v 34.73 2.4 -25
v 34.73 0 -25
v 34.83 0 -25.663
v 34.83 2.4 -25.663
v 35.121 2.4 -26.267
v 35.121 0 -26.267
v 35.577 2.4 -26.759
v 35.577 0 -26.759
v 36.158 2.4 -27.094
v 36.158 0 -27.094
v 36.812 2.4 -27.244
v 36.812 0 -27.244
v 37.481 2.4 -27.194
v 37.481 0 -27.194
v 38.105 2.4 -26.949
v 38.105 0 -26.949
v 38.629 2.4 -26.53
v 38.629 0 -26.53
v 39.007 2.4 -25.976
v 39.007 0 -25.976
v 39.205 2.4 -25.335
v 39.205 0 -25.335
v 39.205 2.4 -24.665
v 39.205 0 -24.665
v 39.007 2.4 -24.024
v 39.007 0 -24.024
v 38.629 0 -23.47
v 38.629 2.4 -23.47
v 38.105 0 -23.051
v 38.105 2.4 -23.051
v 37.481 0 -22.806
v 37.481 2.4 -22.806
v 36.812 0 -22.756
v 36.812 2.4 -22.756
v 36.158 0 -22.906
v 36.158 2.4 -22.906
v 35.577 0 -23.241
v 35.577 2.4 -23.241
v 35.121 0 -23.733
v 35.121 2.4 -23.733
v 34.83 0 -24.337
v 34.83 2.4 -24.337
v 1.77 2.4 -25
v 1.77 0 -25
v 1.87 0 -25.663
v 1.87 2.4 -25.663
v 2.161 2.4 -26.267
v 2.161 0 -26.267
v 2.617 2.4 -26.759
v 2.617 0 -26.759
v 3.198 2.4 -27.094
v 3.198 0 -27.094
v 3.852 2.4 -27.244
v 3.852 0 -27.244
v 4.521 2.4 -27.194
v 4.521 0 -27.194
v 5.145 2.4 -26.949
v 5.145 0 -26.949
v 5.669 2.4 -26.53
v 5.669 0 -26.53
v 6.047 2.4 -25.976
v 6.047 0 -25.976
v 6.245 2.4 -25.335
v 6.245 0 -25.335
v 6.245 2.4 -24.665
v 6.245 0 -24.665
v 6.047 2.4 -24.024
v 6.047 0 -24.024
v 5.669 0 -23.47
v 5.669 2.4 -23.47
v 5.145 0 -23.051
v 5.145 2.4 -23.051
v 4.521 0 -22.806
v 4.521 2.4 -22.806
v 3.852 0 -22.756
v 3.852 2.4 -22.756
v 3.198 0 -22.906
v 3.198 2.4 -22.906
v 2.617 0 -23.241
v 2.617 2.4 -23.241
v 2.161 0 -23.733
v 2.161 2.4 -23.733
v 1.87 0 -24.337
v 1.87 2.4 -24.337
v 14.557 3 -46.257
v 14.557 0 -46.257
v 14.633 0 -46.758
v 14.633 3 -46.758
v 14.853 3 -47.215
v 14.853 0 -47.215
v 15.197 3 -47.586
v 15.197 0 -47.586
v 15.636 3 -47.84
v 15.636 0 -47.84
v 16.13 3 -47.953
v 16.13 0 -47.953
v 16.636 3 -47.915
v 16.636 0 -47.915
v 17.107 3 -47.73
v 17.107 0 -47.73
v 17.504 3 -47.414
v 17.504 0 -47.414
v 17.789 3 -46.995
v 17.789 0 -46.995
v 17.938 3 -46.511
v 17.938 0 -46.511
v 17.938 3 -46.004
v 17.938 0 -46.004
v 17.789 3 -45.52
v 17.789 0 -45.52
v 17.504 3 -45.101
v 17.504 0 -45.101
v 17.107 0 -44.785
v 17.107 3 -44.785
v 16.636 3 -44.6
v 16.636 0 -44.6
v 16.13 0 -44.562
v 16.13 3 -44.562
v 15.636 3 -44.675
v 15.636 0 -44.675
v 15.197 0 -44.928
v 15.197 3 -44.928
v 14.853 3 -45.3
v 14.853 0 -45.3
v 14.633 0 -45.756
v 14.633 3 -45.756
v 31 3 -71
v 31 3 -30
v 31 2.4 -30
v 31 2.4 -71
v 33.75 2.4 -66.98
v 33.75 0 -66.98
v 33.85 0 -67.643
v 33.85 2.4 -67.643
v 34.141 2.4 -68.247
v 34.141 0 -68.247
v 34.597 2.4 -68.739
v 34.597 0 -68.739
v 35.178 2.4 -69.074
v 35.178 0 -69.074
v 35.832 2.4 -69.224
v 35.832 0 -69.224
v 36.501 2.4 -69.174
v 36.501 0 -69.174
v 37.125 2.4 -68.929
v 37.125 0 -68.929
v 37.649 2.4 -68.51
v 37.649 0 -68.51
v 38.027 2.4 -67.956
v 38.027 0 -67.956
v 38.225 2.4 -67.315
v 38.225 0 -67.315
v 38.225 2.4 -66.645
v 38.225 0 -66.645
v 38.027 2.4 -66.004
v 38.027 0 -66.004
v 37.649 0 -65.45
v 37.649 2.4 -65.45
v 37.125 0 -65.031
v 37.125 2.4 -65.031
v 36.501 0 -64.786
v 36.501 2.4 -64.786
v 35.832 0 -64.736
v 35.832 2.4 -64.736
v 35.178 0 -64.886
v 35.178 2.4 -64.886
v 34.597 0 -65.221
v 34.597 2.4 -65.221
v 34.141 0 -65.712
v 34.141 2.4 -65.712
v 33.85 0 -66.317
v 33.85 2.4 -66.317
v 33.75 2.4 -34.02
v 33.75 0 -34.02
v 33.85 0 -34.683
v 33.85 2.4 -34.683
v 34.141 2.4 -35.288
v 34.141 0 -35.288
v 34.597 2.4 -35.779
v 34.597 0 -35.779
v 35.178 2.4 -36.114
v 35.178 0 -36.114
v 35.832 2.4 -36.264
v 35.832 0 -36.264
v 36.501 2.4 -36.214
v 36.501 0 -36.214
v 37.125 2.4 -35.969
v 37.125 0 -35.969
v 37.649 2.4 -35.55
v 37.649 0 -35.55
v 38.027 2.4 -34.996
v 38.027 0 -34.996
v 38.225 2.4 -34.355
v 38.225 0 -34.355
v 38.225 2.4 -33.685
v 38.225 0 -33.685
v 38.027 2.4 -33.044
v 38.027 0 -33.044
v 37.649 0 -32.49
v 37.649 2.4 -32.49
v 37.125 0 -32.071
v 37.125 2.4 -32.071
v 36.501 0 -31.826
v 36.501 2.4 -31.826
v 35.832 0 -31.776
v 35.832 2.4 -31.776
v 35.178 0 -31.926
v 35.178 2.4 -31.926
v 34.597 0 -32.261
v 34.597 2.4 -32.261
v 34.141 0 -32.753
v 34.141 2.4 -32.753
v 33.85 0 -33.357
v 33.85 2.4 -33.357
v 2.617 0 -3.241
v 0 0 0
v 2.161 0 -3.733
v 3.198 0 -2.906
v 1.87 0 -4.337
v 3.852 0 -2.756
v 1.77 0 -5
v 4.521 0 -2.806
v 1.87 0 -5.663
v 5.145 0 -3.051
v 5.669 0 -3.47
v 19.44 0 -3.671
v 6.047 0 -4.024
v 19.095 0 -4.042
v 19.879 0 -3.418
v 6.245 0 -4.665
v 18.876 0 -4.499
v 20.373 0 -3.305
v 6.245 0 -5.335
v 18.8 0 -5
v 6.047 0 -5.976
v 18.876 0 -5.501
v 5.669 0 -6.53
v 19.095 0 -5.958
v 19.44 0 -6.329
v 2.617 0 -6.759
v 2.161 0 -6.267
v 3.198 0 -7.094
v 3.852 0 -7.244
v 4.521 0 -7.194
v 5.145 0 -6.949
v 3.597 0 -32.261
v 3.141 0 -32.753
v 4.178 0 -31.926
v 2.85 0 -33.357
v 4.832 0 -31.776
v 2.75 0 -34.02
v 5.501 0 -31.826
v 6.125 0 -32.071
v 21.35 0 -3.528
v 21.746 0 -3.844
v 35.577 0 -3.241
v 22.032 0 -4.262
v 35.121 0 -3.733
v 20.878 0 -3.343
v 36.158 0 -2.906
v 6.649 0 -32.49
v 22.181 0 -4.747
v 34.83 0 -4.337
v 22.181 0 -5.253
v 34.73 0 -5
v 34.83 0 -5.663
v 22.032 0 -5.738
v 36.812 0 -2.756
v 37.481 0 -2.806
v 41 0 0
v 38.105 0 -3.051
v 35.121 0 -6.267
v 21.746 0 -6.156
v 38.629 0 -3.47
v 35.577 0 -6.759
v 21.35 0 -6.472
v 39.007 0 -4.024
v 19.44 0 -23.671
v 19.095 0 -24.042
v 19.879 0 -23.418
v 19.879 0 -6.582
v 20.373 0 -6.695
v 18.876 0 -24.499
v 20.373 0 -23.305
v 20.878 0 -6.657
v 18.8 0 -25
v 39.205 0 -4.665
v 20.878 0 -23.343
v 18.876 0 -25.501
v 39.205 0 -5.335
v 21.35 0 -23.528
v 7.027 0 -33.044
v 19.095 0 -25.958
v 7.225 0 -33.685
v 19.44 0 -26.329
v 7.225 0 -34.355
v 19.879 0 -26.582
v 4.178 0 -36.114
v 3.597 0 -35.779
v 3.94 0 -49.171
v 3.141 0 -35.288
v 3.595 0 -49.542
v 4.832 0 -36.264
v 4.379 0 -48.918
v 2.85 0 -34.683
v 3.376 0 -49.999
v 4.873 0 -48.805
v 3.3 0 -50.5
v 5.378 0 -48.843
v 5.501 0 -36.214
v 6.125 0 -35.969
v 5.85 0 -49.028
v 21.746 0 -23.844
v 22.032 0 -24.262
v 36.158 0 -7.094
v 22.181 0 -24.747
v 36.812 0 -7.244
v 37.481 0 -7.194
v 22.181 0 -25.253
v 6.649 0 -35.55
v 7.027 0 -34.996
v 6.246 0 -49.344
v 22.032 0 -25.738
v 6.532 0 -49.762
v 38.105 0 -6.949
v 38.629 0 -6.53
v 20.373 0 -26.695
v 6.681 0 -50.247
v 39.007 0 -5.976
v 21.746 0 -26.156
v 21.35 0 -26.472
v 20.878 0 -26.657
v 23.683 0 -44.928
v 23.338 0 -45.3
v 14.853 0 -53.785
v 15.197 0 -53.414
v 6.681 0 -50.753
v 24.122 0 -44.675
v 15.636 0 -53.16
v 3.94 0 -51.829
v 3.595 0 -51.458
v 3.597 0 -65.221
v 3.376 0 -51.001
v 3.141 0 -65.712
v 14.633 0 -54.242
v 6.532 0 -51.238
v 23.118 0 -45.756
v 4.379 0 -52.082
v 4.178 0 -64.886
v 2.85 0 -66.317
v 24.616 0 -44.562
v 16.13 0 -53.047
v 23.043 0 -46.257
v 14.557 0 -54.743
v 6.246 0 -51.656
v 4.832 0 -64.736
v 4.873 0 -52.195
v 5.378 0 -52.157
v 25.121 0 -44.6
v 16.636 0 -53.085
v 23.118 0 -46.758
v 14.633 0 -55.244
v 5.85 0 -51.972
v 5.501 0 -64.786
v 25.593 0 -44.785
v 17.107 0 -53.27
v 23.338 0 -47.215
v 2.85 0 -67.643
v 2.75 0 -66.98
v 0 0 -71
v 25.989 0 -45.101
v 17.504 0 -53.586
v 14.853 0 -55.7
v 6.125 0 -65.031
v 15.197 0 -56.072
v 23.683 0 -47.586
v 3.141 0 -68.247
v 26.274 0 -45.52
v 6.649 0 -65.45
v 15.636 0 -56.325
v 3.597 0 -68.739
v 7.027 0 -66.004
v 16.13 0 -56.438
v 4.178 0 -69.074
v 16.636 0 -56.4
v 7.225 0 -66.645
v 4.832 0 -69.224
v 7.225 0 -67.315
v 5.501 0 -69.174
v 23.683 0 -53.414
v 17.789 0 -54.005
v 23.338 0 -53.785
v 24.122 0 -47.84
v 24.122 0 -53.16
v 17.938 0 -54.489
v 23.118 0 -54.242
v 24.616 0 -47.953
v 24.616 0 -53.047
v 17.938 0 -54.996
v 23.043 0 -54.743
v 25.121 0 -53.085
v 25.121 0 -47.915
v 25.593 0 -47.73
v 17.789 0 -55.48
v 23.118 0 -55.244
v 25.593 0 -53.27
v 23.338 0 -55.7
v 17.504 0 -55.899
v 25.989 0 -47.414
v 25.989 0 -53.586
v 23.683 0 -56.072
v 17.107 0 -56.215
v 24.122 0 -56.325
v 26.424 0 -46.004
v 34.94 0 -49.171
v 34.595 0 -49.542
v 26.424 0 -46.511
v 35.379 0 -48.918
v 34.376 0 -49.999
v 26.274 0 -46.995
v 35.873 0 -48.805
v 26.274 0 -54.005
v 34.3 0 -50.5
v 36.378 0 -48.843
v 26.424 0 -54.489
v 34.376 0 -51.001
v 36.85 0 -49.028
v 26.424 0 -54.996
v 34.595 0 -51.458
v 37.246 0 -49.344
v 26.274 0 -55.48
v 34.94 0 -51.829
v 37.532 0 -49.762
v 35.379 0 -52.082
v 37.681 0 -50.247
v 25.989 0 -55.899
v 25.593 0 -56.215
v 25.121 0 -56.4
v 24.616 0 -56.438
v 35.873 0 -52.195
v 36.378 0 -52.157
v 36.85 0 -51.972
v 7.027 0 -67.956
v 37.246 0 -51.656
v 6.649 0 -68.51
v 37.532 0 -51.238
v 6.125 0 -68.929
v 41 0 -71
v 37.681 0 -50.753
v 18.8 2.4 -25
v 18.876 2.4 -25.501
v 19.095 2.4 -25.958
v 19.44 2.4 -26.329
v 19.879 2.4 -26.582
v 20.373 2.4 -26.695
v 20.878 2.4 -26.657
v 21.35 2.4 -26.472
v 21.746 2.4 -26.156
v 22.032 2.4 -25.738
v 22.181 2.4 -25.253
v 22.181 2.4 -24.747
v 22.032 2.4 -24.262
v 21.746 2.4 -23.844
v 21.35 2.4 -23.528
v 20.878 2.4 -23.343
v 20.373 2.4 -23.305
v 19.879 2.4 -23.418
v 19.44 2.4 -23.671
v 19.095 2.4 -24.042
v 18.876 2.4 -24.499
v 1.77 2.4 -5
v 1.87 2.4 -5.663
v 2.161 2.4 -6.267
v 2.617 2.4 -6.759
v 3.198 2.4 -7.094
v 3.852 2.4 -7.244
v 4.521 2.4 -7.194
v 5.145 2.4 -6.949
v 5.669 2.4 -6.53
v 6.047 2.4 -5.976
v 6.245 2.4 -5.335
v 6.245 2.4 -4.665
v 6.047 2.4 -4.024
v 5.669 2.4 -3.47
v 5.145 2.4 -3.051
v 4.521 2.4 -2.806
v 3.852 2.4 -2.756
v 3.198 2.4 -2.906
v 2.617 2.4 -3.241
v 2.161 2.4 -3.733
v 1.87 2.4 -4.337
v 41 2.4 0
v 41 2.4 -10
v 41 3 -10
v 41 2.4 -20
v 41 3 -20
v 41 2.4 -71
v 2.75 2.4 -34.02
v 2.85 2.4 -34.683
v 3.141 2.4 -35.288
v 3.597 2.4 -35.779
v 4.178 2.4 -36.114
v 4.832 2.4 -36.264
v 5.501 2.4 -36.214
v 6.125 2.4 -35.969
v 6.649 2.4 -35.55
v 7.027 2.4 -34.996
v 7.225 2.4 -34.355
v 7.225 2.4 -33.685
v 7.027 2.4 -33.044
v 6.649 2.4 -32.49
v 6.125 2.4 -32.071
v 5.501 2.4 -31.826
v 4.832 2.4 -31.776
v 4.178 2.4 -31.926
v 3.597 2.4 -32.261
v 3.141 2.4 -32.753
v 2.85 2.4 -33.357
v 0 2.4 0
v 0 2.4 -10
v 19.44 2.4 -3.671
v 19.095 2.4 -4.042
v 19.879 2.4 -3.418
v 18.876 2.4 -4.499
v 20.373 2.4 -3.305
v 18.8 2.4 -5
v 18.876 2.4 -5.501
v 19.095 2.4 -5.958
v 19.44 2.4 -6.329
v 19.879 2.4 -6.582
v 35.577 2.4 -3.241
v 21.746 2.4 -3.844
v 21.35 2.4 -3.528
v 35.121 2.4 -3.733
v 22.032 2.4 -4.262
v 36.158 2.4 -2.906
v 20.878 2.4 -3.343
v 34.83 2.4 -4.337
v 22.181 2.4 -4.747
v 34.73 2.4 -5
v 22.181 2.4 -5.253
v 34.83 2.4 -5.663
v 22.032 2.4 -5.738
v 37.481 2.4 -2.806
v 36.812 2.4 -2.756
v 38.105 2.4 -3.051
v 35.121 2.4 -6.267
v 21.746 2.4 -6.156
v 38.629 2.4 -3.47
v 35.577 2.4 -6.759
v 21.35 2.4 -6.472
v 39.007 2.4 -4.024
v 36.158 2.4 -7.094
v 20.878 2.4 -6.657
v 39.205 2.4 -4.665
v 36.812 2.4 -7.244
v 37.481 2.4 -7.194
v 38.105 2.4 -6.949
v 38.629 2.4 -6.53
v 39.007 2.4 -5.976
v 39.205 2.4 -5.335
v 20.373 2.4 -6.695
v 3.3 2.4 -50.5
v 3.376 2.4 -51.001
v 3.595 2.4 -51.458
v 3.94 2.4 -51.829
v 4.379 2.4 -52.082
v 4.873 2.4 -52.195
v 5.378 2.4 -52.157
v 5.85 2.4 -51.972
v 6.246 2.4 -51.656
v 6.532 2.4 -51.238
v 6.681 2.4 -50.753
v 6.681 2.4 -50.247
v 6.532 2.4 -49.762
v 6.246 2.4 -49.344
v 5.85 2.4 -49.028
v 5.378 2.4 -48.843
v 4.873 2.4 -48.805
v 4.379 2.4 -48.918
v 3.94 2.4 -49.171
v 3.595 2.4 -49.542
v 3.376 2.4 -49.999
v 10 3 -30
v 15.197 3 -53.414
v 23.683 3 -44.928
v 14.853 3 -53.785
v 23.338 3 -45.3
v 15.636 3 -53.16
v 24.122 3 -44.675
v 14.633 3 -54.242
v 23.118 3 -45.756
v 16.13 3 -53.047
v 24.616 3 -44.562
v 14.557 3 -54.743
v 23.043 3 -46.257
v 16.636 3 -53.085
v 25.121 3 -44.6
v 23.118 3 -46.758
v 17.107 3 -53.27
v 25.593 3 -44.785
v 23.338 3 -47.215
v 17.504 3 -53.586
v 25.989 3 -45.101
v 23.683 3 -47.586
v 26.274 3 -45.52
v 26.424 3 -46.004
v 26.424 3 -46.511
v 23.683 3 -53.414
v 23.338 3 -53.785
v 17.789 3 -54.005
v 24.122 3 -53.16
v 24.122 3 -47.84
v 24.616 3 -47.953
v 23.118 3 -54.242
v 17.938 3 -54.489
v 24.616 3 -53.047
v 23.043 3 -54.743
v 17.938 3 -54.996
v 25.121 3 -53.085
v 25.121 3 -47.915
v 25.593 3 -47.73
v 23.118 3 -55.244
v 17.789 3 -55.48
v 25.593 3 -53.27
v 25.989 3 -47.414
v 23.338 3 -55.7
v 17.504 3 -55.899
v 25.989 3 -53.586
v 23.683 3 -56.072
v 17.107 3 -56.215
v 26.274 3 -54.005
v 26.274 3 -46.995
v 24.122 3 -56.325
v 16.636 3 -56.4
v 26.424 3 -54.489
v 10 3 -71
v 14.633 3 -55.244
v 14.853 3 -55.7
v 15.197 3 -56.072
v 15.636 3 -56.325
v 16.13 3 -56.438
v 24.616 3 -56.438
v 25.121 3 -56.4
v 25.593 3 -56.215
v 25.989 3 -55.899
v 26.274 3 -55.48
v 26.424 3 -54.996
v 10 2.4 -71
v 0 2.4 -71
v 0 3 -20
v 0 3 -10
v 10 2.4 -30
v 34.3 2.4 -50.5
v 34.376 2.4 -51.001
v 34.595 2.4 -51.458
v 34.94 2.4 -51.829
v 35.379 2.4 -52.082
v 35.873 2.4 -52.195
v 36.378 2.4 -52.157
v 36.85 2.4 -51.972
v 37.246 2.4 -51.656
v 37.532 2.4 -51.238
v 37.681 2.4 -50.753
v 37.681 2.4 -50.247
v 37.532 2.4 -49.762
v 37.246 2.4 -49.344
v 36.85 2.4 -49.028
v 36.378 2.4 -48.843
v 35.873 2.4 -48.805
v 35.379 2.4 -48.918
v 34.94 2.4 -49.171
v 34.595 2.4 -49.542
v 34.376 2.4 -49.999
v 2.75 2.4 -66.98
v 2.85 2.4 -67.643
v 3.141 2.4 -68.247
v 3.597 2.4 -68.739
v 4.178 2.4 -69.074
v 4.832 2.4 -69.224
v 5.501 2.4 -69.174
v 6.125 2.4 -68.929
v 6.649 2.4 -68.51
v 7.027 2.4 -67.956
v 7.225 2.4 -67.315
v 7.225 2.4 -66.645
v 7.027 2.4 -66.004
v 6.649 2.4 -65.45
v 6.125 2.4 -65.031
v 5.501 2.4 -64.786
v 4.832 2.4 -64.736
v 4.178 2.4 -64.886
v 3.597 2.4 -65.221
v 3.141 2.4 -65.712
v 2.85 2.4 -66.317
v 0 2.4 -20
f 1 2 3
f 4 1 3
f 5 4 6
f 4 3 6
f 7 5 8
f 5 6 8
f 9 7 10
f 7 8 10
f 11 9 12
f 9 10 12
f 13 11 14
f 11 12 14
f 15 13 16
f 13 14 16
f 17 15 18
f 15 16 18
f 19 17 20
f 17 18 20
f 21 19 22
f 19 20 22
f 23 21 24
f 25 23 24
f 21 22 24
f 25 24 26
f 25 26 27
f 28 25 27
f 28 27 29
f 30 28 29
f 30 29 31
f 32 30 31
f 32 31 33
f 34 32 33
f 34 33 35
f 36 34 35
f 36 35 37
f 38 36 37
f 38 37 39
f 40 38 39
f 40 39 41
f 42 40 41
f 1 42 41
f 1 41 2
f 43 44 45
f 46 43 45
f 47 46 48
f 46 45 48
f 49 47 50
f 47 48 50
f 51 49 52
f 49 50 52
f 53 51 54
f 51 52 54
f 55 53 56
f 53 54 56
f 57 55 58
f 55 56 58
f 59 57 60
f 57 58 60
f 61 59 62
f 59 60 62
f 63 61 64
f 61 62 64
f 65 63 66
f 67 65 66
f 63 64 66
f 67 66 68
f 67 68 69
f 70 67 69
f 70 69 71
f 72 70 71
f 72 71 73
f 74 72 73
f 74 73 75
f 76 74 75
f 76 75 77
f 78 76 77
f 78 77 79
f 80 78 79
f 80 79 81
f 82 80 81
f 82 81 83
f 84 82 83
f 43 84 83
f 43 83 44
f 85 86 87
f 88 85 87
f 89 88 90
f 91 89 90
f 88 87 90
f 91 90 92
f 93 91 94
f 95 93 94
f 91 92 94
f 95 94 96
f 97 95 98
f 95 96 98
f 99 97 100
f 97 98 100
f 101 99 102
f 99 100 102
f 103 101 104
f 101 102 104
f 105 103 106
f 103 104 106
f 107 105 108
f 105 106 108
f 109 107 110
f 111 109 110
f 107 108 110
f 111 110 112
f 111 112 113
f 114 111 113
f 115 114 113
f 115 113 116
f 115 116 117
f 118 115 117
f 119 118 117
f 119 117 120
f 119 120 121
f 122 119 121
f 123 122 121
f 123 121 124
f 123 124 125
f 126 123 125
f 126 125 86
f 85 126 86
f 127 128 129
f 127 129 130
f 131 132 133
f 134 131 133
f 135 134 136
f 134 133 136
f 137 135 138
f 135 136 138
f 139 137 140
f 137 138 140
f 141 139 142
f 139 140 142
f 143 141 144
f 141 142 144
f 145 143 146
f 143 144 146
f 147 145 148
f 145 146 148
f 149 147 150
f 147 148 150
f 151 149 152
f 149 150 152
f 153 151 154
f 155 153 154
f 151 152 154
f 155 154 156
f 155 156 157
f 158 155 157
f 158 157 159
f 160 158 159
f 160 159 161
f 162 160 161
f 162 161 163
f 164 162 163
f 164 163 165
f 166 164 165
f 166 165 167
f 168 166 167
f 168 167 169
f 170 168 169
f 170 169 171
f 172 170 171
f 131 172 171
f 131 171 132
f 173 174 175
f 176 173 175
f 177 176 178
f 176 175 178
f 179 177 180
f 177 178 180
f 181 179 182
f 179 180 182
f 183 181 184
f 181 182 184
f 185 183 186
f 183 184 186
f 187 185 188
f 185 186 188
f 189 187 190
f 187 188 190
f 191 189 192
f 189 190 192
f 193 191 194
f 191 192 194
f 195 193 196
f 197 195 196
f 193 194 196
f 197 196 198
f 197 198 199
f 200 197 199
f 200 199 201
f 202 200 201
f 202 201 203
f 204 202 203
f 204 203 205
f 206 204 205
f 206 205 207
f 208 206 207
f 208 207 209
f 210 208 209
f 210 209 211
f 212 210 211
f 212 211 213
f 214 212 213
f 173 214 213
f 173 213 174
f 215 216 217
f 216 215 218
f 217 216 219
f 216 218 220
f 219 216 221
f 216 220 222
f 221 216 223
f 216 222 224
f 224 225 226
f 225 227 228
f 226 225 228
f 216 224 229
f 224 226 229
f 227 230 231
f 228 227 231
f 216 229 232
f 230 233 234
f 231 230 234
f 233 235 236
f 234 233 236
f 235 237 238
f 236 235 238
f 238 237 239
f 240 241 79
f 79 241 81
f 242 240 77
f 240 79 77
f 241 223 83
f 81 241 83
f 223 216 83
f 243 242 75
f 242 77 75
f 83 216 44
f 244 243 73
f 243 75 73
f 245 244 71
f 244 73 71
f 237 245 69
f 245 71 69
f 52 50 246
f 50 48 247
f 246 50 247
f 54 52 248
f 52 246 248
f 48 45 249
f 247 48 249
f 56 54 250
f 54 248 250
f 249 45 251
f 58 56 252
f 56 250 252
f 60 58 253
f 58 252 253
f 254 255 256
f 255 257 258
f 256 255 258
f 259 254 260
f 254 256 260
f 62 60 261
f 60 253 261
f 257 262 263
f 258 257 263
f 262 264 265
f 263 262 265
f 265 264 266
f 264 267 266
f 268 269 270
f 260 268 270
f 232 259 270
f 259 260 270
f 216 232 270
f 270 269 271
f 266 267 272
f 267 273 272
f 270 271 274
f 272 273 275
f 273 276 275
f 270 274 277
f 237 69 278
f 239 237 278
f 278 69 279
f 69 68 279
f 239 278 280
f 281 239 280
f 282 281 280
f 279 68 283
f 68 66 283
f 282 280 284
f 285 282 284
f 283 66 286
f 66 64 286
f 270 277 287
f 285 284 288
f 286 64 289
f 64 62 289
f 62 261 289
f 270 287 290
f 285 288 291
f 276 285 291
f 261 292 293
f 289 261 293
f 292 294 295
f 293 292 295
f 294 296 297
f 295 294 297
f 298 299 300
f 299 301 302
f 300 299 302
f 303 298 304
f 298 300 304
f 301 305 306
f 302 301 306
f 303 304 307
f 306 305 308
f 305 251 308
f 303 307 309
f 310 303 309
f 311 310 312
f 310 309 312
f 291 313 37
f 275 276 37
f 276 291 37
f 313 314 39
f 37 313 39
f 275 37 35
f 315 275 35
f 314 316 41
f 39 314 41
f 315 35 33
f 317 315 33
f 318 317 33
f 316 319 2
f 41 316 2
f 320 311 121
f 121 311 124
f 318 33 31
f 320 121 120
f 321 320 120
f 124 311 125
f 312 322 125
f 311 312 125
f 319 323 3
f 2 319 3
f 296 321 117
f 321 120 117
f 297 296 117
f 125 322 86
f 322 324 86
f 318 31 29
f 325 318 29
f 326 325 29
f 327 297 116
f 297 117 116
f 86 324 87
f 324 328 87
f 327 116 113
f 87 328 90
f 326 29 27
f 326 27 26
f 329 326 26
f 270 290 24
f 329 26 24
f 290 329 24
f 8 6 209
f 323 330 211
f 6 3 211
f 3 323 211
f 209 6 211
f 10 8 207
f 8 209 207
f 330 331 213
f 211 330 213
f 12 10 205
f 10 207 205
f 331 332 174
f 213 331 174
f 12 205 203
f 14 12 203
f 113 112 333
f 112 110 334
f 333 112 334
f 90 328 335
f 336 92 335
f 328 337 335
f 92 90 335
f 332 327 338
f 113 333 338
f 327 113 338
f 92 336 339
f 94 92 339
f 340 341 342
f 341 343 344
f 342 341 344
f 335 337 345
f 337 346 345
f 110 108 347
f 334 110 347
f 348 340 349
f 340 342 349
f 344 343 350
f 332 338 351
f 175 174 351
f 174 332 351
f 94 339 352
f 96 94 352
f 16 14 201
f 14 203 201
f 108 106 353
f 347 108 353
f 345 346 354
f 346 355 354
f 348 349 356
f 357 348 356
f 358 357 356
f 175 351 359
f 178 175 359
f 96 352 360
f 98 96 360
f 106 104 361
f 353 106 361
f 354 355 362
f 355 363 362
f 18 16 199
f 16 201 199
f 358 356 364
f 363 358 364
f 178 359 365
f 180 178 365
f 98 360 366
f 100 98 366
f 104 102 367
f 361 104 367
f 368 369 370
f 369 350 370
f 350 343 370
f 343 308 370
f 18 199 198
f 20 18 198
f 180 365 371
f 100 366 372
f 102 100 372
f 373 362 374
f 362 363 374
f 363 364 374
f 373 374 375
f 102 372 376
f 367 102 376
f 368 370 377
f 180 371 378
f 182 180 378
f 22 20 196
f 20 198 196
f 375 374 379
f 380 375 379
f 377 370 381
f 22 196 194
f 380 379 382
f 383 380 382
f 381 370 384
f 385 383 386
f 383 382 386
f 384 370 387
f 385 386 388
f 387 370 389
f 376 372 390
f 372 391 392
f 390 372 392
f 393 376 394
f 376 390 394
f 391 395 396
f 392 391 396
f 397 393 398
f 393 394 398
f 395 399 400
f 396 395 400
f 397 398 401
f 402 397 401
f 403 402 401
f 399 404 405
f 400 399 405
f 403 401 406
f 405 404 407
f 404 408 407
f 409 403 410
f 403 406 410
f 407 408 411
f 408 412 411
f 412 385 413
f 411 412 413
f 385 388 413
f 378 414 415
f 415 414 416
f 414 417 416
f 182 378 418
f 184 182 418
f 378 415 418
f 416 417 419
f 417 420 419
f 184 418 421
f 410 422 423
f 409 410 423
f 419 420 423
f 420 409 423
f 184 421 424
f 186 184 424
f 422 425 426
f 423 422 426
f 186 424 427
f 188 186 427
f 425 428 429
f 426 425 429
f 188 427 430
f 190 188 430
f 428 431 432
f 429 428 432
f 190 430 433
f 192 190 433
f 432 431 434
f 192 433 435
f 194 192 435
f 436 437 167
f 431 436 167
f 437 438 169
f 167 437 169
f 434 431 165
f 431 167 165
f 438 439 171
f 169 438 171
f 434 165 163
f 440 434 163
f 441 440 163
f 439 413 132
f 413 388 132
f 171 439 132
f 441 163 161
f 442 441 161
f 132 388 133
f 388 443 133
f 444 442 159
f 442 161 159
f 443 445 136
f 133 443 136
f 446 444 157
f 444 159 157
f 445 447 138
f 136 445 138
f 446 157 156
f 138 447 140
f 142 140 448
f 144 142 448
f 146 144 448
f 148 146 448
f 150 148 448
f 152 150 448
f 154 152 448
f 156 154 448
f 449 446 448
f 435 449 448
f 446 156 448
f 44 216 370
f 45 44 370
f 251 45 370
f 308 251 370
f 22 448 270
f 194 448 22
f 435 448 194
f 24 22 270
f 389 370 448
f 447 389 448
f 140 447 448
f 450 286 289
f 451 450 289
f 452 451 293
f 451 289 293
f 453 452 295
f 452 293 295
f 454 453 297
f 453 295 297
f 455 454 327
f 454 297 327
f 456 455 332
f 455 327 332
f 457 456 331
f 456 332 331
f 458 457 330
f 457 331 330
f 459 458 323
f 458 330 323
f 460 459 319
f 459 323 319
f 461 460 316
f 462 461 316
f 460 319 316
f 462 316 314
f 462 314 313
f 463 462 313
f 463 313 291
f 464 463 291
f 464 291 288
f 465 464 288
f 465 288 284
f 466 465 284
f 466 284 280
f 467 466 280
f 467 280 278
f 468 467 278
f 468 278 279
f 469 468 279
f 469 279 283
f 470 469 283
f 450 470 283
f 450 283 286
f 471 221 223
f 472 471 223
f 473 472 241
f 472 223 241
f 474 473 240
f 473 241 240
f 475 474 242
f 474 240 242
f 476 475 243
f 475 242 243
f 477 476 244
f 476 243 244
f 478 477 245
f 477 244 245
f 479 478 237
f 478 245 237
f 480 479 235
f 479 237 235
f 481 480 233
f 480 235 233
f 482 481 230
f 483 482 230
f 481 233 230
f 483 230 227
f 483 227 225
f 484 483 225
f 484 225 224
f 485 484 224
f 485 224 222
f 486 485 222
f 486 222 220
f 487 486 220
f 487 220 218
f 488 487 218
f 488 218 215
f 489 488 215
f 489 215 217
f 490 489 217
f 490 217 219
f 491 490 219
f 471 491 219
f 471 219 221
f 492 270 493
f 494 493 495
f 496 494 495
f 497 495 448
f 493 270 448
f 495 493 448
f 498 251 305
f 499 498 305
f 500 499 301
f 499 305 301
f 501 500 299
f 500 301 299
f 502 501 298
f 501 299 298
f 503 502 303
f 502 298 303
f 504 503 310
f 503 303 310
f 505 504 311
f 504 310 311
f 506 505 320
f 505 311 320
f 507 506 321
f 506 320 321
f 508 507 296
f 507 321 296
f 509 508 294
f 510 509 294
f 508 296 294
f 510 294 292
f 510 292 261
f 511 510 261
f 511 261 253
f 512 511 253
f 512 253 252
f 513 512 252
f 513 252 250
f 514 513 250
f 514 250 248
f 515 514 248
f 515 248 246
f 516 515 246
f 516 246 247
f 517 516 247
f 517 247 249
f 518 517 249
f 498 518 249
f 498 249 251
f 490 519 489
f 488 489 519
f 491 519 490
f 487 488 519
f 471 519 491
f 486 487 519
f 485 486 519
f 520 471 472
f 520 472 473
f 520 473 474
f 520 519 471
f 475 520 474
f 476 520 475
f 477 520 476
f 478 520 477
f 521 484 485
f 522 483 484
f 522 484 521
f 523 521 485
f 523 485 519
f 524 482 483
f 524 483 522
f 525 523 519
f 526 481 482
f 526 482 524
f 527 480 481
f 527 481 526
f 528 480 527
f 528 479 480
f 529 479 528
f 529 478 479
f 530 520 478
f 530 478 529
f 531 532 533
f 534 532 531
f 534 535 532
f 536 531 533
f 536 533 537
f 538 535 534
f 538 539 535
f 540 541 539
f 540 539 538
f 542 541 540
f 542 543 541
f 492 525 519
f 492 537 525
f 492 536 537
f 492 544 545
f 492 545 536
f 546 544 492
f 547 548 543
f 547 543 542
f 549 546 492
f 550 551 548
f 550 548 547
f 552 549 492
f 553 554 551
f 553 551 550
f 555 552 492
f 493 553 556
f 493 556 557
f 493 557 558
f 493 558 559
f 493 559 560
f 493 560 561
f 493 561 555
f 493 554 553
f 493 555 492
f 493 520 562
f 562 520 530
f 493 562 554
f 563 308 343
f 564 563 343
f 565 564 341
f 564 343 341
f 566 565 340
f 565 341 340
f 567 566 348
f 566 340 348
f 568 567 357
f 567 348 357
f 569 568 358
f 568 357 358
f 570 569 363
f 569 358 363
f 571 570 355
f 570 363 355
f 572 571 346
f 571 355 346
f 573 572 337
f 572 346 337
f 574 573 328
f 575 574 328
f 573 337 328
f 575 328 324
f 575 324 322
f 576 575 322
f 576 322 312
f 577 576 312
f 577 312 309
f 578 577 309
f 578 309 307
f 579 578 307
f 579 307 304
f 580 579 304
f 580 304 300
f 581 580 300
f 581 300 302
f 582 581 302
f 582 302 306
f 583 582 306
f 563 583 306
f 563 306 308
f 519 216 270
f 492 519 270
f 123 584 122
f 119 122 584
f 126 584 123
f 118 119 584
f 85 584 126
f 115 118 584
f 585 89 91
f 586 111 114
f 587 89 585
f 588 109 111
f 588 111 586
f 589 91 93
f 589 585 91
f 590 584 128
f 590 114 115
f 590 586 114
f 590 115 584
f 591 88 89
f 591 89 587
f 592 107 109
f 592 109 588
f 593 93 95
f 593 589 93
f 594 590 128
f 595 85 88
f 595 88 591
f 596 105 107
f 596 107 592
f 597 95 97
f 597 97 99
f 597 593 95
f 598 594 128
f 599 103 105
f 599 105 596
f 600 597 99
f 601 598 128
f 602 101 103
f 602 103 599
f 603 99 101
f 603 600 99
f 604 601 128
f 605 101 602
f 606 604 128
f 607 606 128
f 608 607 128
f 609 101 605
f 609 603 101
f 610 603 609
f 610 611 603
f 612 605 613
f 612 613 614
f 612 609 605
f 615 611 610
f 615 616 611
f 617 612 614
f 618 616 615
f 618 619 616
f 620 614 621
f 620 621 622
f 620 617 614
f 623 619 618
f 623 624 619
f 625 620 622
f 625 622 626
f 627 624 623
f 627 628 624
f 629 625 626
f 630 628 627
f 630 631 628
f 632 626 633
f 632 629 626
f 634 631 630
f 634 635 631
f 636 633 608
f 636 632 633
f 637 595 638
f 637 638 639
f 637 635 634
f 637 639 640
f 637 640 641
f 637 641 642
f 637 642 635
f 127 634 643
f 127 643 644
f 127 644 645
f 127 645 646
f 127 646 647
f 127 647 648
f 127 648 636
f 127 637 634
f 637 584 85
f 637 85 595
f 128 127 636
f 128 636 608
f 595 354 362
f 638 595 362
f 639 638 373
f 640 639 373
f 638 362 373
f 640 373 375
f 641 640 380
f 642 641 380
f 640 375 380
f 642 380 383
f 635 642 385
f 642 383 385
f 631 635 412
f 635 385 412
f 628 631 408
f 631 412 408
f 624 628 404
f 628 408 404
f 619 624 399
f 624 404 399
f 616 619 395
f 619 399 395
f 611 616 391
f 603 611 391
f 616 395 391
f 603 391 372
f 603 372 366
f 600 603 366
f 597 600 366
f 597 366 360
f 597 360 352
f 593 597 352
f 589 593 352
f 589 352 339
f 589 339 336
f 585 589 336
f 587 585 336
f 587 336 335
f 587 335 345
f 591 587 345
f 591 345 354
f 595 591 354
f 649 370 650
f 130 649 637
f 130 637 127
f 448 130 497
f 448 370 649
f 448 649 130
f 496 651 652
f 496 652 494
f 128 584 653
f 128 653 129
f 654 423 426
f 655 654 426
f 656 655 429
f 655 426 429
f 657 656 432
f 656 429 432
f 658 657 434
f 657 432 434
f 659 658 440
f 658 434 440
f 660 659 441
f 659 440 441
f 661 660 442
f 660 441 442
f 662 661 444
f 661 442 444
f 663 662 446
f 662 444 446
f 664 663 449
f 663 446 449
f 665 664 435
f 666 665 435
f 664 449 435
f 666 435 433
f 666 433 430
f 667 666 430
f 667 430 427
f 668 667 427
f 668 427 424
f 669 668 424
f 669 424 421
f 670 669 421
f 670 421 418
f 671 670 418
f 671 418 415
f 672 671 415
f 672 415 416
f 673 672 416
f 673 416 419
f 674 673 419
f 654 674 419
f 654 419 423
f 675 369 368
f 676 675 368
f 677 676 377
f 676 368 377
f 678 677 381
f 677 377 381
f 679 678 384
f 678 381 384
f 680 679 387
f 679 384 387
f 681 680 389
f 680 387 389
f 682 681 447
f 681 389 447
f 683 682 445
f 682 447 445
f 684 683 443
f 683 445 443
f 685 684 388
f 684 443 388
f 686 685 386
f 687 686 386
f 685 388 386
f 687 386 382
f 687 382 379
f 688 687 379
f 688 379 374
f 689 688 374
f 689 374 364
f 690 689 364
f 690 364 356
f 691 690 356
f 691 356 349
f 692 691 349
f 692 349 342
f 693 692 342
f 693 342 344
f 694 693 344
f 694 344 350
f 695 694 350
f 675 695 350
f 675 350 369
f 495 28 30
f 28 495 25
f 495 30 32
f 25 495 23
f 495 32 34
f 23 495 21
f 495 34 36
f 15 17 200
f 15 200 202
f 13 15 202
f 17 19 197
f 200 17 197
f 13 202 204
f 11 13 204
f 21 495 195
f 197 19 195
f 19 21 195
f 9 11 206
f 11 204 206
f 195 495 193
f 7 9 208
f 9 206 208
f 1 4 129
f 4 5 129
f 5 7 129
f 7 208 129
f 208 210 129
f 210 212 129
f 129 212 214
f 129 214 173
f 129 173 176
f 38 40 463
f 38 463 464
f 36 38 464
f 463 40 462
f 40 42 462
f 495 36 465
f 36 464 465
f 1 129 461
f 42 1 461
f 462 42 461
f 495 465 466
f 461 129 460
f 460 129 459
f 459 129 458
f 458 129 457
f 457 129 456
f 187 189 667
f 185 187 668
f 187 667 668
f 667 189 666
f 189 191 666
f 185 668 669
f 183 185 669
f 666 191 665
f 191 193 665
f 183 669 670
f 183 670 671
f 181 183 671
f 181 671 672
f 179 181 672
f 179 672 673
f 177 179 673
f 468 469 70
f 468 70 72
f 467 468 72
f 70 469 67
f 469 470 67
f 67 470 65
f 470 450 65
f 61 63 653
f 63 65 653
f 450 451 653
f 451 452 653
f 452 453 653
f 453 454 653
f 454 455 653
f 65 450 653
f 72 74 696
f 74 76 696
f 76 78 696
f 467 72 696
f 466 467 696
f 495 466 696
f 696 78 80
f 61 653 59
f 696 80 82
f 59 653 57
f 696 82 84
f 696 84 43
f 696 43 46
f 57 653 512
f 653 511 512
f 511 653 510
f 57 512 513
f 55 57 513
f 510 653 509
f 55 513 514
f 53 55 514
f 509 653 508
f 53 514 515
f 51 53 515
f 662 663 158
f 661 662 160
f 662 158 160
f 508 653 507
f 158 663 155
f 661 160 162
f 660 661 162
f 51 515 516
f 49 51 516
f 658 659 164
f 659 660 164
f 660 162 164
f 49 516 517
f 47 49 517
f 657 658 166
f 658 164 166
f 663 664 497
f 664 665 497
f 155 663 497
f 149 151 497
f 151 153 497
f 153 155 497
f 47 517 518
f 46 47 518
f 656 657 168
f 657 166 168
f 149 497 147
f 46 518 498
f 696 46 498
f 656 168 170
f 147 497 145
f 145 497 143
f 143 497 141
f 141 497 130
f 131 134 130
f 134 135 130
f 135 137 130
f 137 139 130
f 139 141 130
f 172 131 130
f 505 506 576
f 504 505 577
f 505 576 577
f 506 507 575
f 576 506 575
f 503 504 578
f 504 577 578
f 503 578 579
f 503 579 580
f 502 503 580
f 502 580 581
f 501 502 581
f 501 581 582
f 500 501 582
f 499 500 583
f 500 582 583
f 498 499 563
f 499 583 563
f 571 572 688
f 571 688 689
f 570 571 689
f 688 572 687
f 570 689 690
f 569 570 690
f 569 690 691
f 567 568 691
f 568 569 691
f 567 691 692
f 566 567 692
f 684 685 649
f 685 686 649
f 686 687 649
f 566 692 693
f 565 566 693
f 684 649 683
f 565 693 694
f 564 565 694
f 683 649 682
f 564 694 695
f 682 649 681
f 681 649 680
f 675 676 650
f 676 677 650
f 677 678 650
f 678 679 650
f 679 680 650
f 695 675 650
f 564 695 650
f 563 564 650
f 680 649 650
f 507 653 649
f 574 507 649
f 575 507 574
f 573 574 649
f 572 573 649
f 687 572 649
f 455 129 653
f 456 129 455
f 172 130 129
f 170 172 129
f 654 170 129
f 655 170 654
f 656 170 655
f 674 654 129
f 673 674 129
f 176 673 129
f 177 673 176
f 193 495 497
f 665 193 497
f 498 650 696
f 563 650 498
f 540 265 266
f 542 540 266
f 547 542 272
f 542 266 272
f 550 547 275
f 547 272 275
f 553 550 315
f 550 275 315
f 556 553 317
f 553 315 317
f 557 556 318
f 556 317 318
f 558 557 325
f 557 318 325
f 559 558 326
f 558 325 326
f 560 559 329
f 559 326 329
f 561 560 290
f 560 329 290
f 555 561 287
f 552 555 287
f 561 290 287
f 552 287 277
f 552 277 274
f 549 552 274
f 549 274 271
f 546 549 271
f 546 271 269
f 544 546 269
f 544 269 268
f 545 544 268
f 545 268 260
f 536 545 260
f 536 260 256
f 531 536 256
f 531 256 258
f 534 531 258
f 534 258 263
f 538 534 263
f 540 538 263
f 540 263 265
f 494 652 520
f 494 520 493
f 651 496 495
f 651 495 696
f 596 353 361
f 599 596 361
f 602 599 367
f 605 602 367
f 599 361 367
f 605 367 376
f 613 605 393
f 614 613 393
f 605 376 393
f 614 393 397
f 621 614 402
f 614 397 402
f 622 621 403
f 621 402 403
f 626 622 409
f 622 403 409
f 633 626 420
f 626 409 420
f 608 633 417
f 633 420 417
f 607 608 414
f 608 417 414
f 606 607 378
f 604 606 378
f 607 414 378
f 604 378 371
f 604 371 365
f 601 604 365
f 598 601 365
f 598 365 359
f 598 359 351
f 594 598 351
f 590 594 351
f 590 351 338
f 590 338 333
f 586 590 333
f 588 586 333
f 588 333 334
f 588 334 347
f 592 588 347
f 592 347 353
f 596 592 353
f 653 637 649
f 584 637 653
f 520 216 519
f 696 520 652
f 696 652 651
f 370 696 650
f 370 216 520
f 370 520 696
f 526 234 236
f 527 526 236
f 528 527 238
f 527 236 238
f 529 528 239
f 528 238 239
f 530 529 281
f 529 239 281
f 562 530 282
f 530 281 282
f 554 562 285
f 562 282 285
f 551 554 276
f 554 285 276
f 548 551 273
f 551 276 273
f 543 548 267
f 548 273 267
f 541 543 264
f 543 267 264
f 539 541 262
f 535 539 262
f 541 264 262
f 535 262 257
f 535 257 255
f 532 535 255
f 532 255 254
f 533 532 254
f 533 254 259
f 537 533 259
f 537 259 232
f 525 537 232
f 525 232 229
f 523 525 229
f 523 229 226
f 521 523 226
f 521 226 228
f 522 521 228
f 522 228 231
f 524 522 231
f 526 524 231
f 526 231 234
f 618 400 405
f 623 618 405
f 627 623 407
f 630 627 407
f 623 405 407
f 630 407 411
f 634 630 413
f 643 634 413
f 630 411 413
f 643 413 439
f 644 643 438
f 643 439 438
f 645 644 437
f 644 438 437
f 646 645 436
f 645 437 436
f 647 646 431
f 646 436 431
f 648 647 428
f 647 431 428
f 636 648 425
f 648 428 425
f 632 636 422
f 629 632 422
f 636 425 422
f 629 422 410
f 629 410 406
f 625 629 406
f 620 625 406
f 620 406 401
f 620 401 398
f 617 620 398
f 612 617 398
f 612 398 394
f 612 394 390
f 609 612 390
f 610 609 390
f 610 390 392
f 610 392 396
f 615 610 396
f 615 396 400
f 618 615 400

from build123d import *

# Parameters (mm, degrees)
SKETCH_1_W          = 41
SKETCH_1_H          = 71
EXTRUDE_1_DEPTH     = 3
SKETCH_2_W          = 41
SKETCH_2_H          = 10
CUT_EXTRUDE_1_DEPTH = 0.6
HOLE_WIZARD_M41_D   = 4.5
HOLE_WIZARD_M31_D   = 3.4
HOLE_WIZARD_M32_D   = 3.4


with BuildPart() as part:
    # Эскиз1 → Бобышка-Вытянуть1 (new body)
    with BuildSketch(Plane(origin=(0, 0, 0), x_dir=(1, 0, 0), z_dir=(0, 1, 0))):
        with Locations((20.5, 35.5)):
            Rectangle(SKETCH_1_W, SKETCH_1_H)
    extrude(amount=EXTRUDE_1_DEPTH)

    # Эскиз2 → Вырез-Вытянуть1 (cut)
    with BuildSketch(Plane(origin=(0, 3, 0), x_dir=(1, 0, 0), z_dir=(0, 1, 0))):
        with Locations((20.5, 5)):
            Rectangle(SKETCH_2_W, SKETCH_2_H)
        Polygon((0, 71), (10, 71), (10, 30), (31, 30), (31, 71), (41, 71), (41, 30), (41, 20), (0, 20), (0, 30), align=None)
    extrude(amount=-CUT_EXTRUDE_1_DEPTH, mode=Mode.SUBTRACT)

    # Отверстие с зазором M41 (through all)
    with Locations(Plane(origin=(24.31748925, 3, -29.970792186), x_dir=(1, 0, 0), z_dir=(0, 1, 0))):
        with Locations((-20.297457148, -24.970792186), (12.662478647, -24.970792186), (12.662478647, -4.970792186), (-20.297457148, -4.970792186), (-19.31748925, 4.049239917), (11.68251075, 4.049239917), (11.68251075, 37.009175711), (-19.31748925, 37.009175711)):
            Hole(HOLE_WIZARD_M41_D / 2)

    # Отверстие с зазором M31 (through all)
    with Locations(Plane(origin=(24.31748925, 3, -29.970792186), x_dir=(1, 0, 0), z_dir=(0, 1, 0))):
        with Locations((-3.81748925, -24.970792186), (-3.81748925, -4.970792186), (-19.31748925, 20.529207814), (11.68251075, 20.529207814)):
            Hole(HOLE_WIZARD_M31_D / 2)

    # Отверстие с зазором M32 (through all)
    with Locations(Plane(origin=(0, 3, 0), x_dir=(1, 0, 0), z_dir=(0, 1, 0))):
        with Locations((16.257359313, 46.257359313), (16.257359313, 54.742640687), (24.742640687, 54.742640687), (24.742640687, 46.257359313)):
            Hole(HOLE_WIZARD_M32_D / 2)


solid = part.part
